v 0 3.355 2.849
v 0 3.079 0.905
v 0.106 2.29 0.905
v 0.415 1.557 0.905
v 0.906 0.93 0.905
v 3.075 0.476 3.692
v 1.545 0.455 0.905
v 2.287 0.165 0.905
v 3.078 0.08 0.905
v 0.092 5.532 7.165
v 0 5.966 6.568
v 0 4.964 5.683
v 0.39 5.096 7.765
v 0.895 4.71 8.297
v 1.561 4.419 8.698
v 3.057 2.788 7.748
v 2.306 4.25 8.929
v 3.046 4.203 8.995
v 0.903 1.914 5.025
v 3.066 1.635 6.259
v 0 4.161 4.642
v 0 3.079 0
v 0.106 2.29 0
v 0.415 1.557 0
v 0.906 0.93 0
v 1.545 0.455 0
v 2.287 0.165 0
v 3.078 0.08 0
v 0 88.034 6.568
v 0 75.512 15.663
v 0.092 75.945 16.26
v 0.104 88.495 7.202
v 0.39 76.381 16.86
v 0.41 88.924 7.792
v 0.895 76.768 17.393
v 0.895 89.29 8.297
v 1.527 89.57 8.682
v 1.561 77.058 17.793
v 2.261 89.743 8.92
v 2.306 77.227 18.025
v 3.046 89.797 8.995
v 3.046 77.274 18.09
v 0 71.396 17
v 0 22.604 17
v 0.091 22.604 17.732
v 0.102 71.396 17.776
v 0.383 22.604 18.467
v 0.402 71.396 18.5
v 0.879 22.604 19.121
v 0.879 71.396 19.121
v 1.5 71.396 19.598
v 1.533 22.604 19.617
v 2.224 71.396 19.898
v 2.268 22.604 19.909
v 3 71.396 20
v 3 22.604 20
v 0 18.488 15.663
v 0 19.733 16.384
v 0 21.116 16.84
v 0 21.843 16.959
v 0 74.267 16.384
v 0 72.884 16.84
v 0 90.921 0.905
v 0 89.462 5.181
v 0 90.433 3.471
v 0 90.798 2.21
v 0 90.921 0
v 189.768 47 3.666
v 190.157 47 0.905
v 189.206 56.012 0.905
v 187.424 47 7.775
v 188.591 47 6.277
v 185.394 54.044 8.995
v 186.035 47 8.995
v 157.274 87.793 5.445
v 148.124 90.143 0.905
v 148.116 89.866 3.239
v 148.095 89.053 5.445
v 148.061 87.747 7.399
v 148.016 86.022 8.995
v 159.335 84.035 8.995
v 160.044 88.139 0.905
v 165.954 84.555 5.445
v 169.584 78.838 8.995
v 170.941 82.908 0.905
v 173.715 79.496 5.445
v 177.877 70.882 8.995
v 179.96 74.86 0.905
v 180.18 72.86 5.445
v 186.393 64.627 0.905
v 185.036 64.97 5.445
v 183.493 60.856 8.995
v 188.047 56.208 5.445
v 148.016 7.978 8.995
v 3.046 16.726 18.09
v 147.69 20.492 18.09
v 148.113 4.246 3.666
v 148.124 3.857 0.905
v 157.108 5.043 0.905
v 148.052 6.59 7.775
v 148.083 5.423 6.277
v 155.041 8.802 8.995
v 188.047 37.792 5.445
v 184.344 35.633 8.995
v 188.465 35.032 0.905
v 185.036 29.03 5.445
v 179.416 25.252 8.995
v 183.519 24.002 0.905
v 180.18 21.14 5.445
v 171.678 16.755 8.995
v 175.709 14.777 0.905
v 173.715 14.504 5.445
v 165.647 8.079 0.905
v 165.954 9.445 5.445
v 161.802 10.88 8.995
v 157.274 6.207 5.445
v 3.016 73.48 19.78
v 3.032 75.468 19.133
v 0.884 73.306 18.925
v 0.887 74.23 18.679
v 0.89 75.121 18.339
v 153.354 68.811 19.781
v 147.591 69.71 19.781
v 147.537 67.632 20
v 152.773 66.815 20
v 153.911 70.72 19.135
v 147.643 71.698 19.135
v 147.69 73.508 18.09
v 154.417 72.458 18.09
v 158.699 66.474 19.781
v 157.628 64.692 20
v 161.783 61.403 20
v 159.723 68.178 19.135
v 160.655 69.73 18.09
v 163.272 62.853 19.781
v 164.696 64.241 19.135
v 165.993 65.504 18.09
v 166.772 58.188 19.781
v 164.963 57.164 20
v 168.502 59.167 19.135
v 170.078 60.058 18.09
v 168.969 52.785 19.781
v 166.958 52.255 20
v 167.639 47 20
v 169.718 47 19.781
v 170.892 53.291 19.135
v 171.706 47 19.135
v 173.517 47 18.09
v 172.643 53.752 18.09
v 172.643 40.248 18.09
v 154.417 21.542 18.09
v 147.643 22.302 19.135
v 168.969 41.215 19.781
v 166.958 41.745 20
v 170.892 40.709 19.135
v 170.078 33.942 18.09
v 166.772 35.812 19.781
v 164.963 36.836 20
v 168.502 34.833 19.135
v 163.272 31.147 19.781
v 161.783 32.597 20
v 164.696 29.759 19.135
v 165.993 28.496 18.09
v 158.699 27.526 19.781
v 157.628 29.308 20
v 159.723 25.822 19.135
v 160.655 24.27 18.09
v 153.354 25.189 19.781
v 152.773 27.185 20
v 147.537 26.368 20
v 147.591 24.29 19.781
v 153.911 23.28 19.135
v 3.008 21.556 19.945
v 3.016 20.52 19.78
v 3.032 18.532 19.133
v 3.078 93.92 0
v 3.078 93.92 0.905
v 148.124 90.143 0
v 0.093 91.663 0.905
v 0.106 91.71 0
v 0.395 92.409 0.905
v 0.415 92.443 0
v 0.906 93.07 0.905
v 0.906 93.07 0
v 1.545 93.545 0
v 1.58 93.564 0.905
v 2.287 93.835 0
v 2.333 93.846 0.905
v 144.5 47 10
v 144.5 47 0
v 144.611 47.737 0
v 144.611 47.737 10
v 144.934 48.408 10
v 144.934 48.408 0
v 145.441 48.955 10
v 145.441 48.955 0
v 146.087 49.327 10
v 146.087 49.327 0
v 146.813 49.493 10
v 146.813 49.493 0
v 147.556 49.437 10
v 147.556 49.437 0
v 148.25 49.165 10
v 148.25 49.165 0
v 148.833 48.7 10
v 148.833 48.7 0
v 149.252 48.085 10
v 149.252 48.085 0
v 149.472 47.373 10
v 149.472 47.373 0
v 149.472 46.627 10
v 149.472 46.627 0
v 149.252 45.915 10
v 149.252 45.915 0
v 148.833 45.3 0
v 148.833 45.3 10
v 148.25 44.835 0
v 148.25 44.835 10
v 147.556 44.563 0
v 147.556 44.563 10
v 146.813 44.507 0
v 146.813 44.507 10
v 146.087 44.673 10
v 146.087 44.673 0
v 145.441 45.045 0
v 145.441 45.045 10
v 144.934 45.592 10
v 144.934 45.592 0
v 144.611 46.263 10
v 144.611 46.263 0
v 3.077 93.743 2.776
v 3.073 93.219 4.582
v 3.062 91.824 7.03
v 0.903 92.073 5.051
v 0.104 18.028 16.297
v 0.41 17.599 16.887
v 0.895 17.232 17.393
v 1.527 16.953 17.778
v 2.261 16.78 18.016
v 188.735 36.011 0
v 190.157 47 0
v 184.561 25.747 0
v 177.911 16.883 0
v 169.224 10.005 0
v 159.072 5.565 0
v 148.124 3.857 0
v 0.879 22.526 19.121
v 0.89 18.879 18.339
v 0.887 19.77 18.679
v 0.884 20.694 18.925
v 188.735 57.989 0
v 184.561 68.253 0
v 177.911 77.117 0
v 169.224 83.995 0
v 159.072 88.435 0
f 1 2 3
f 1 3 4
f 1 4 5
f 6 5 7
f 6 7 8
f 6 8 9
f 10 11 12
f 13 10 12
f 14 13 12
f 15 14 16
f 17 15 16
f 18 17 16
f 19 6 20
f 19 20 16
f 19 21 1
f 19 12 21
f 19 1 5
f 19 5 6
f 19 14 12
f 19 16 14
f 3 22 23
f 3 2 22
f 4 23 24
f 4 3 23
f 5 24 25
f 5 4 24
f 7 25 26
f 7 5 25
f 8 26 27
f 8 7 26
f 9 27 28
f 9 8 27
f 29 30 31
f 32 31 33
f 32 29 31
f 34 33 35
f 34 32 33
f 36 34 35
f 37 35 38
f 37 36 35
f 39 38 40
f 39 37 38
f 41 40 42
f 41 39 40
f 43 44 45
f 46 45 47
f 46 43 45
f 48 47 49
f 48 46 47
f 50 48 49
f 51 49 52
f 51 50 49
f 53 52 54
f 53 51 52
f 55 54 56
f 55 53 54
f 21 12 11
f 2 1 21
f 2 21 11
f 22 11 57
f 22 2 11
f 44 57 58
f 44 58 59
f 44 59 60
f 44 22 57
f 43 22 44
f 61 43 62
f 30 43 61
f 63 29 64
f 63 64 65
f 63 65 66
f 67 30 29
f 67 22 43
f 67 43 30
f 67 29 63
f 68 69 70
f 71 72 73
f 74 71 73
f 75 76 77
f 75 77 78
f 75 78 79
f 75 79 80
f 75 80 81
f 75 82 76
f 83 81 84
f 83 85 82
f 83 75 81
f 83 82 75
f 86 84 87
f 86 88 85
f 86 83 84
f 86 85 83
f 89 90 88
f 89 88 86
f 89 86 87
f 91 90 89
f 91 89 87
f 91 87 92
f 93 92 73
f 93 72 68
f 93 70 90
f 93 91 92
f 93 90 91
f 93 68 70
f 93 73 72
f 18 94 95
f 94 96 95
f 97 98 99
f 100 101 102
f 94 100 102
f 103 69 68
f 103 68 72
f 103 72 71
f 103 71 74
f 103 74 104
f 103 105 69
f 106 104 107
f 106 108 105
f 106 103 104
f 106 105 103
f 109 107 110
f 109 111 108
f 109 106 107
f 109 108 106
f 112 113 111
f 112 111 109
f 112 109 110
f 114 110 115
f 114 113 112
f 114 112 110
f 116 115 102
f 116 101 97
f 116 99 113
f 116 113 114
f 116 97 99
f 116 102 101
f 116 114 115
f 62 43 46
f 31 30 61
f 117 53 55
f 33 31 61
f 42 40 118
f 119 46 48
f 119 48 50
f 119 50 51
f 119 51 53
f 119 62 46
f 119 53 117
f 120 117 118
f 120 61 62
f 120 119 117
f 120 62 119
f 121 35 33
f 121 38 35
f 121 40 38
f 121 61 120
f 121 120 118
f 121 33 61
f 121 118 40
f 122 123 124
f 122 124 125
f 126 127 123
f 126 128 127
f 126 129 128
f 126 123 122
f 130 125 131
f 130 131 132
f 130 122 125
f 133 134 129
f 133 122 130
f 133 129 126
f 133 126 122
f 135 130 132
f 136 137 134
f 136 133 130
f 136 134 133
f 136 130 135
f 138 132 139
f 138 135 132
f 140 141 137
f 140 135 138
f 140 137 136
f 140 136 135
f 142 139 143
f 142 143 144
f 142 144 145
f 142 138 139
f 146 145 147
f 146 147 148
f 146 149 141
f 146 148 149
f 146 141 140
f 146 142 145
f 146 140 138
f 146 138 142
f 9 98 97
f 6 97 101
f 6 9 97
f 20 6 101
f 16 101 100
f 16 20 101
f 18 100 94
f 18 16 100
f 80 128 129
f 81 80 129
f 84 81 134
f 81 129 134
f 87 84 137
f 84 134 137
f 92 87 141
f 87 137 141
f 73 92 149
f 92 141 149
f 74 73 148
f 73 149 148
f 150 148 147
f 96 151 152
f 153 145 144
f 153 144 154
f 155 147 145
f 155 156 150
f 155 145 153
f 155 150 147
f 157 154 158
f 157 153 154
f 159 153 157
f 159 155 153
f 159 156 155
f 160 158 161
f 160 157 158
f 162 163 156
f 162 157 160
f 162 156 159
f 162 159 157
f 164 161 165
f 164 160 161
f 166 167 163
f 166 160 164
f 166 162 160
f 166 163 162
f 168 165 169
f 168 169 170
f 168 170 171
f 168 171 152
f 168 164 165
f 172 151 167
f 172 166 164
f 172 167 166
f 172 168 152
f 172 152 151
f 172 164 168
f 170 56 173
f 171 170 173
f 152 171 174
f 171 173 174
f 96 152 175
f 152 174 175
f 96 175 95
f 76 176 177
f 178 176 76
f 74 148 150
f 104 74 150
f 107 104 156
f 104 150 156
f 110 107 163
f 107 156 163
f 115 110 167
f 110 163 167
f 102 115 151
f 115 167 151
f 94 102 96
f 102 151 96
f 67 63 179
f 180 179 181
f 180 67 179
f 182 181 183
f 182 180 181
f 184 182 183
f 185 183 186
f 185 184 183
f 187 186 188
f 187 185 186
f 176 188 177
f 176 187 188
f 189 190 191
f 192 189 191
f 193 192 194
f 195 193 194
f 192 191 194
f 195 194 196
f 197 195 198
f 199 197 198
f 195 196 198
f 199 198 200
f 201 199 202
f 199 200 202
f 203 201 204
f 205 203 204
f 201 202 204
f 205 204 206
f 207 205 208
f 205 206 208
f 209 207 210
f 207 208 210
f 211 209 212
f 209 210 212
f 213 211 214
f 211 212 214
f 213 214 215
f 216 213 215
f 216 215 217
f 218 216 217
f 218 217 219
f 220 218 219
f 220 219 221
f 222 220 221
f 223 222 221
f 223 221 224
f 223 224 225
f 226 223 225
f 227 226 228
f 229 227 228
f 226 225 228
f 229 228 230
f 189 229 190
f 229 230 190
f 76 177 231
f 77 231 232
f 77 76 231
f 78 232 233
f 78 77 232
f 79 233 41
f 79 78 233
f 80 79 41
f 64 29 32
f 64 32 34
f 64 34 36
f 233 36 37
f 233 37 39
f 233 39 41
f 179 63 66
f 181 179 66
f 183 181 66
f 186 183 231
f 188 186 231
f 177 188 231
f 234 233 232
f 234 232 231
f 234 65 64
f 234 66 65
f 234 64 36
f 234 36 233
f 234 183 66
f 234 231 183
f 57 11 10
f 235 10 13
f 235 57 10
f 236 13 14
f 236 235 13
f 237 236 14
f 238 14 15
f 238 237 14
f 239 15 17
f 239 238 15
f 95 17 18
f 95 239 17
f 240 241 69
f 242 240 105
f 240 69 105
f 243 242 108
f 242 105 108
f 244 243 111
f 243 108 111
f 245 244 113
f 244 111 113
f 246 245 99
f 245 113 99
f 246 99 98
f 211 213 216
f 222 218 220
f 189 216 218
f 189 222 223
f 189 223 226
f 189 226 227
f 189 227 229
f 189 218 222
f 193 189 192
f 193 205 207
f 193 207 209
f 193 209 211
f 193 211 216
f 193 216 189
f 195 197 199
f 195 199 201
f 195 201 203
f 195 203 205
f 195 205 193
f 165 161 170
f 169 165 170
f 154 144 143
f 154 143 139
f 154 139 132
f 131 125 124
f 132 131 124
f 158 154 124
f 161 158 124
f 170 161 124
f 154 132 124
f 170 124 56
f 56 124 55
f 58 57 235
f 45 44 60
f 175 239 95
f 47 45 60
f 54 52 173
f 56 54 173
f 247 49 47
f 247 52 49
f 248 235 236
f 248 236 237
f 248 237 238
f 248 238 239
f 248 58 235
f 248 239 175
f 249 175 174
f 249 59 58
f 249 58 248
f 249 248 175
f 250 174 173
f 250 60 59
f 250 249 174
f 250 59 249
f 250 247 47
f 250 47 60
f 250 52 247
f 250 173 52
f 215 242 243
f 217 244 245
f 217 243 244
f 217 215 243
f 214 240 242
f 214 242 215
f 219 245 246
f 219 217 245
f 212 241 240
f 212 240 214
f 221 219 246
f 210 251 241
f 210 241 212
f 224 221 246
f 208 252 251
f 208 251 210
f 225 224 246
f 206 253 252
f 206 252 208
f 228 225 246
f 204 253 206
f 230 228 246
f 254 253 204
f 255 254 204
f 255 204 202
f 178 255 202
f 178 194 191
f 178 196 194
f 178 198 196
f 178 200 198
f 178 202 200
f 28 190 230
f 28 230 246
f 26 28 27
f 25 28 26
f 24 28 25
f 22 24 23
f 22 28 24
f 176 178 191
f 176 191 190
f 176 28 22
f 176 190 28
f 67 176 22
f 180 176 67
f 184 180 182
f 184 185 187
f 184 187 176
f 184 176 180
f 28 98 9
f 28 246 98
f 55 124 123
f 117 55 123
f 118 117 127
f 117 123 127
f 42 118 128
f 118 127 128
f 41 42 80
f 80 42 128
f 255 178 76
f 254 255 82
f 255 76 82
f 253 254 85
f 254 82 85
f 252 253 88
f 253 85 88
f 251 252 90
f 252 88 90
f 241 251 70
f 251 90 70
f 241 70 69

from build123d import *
from OCP.BRepFilletAPI import BRepFilletAPI_MakeChamfer

# Parameters (mm, degrees)
EXTRUDE_1_DEPTH     = 20
CUT_EXTRUDE_1_DEPTH = 215.709105536
CHAMFER_1_SIZE      = 14
CHAMFER_1_SIZE2     = 19.269346887
FILLET_1_R          = 10
FILLET_2_R          = 3
SKETCH_3_R          = 2.5
CUT_EXTRUDE_2_DEPTH = 10


with BuildPart() as part:
    # ｽｹｯﾁ1 → 押し出し1 (new body)
    with BuildSketch(Plane.XY):
        Polygon((0, 0), (0, 94), (192, 89), (192, 5), align=None)
    extrude(amount=EXTRUDE_1_DEPTH)

    # ｽｹｯﾁ2 → ｶｯﾄ - 押し出し1 (cut, through all)
    with BuildSketch(Plane.XY.offset(20)):
        with BuildLine():
            Line((192, 89), (148.123504516, 90.14261707))
            ThreePointArc((148.123504516, 90.14261707), (177.911446327, 77.116941346), (190.157243541, 47))
            ThreePointArc((190.157243541, 47), (177.911447055, 16.883059402), (148.123506603, 3.857382984))
            Line((148.123506603, 3.857382984), (192, 5))
            Line((192, 5), (192, 89))
        make_face()
    extrude(amount=-CUT_EXTRUDE_1_DEPTH, mode=Mode.SUBTRACT)

    # 面取り1: one chamfer whose edges measure the first distance from different faces: ONE call of the kernel's chamfer builder (chamfer() names one face for all edges)
    chamfer_1_edges_1 = [part.edges().sort_by_distance(p)[0] for p in [
        (74.061752258, 92.071308535, 20),
    ]]
    chamfer_1_side_1 = [part.faces().sort_by_distance(p)[0] for p in [
        (74.061752258, 92.071308535, 10),
    ]]
    chamfer_1_edges_2 = [part.edges().sort_by_distance(p)[0] for p in [
        (190.157243541, 47.000001044, 20),
    ]]
    chamfer_1_side_2 = [part.faces().sort_by_distance(p)[0] for p in [
        (190.157243541, 47.000001044, 10),
    ]]
    chamfer_1_edges_3 = [part.edges().sort_by_distance(p)[0] for p in [
        (74.061753301, 1.928691492, 20),
    ]]
    chamfer_1_side_3 = [part.faces().sort_by_distance(p)[0] for p in [
        (74.061753301, 1.928691492, 10),
    ]]
    chamfer_1 = BRepFilletAPI_MakeChamfer(part.part.solid().wrapped)
    for e in chamfer_1_edges_1:
        chamfer_1.Add(CHAMFER_1_SIZE, CHAMFER_1_SIZE2, e.wrapped, chamfer_1_side_1[0].wrapped)  # the first distance lies on this face
    for e in chamfer_1_edges_2:
        chamfer_1.Add(CHAMFER_1_SIZE, CHAMFER_1_SIZE2, e.wrapped, chamfer_1_side_2[0].wrapped)  # the first distance lies on this face
    for e in chamfer_1_edges_3:
        chamfer_1.Add(CHAMFER_1_SIZE, CHAMFER_1_SIZE2, e.wrapped, chamfer_1_side_3[0].wrapped)  # the first distance lies on this face
    add(Compound.cast(chamfer_1.Shape()), mode=Mode.REPLACE)

    # ﾌｨﾚｯﾄ1
    fillet_1_edges = [part.edges().sort_by_distance(p)[0] for p in [
        (73.810934338, 72.801960541, 20),
        (170.887896654, 47.000000578, 20),
        (73.810935381, 21.198039486, 20),
        (74.061753301, 1.928691492, 6),
        (190.157243541, 47.000001044, 6),
        (74.061752258, 92.071308535, 6),
    ]]
    fillet(fillet_1_edges, radius=FILLET_1_R)

    # ﾌｨﾚｯﾄ2
    fillet_2_edges = [part.edges().sort_by_distance(p)[0] for p in [
        (0, 47, 20),
        (0, 10.38493898, 13.542542696),
        (0, 0, 0.452372753),
        (0, 83.61506102, 13.542542696),
        (0, 94, 0.452372753),
        (0, 92.909567354, 5.44490235),
        (0, 74.564948876, 19.510594551),
        (0, 1.090432646, 5.44490235),
        (0, 19.435051124, 19.510594551),
    ]]
    fillet(fillet_2_edges, radius=FILLET_2_R)

    # ｽｹｯﾁ3 → ｶｯﾄ - 押し出し2 (cut)
    with BuildSketch(Plane(origin=(0, 0, 0), x_dir=(-1, 0, 0), z_dir=(0, 0, -1))):
        with Locations((-147, 47)):
            Circle(SKETCH_3_R)
    extrude(amount=-CUT_EXTRUDE_2_DEPTH, mode=Mode.SUBTRACT)


solid = part.part
